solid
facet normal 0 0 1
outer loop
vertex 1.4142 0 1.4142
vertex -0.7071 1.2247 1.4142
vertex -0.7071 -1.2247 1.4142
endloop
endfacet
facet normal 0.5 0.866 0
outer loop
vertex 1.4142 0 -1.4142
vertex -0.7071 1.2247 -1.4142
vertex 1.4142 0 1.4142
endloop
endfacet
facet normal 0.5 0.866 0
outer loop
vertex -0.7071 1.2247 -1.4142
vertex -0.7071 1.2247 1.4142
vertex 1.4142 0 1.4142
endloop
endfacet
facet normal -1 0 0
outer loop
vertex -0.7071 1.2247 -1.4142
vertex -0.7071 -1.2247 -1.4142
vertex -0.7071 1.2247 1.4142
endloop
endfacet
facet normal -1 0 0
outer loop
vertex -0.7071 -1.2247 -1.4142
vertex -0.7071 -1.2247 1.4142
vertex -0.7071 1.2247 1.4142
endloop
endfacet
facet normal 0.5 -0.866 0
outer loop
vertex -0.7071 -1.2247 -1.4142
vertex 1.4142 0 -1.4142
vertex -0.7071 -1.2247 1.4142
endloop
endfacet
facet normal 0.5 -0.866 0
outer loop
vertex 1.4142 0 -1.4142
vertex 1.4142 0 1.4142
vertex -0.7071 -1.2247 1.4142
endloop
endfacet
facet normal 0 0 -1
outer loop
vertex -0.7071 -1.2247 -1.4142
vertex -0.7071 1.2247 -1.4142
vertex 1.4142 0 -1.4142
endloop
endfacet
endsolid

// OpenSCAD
// $fn below the minimum of 3 fragments
sphere(2, $fn = 2);
